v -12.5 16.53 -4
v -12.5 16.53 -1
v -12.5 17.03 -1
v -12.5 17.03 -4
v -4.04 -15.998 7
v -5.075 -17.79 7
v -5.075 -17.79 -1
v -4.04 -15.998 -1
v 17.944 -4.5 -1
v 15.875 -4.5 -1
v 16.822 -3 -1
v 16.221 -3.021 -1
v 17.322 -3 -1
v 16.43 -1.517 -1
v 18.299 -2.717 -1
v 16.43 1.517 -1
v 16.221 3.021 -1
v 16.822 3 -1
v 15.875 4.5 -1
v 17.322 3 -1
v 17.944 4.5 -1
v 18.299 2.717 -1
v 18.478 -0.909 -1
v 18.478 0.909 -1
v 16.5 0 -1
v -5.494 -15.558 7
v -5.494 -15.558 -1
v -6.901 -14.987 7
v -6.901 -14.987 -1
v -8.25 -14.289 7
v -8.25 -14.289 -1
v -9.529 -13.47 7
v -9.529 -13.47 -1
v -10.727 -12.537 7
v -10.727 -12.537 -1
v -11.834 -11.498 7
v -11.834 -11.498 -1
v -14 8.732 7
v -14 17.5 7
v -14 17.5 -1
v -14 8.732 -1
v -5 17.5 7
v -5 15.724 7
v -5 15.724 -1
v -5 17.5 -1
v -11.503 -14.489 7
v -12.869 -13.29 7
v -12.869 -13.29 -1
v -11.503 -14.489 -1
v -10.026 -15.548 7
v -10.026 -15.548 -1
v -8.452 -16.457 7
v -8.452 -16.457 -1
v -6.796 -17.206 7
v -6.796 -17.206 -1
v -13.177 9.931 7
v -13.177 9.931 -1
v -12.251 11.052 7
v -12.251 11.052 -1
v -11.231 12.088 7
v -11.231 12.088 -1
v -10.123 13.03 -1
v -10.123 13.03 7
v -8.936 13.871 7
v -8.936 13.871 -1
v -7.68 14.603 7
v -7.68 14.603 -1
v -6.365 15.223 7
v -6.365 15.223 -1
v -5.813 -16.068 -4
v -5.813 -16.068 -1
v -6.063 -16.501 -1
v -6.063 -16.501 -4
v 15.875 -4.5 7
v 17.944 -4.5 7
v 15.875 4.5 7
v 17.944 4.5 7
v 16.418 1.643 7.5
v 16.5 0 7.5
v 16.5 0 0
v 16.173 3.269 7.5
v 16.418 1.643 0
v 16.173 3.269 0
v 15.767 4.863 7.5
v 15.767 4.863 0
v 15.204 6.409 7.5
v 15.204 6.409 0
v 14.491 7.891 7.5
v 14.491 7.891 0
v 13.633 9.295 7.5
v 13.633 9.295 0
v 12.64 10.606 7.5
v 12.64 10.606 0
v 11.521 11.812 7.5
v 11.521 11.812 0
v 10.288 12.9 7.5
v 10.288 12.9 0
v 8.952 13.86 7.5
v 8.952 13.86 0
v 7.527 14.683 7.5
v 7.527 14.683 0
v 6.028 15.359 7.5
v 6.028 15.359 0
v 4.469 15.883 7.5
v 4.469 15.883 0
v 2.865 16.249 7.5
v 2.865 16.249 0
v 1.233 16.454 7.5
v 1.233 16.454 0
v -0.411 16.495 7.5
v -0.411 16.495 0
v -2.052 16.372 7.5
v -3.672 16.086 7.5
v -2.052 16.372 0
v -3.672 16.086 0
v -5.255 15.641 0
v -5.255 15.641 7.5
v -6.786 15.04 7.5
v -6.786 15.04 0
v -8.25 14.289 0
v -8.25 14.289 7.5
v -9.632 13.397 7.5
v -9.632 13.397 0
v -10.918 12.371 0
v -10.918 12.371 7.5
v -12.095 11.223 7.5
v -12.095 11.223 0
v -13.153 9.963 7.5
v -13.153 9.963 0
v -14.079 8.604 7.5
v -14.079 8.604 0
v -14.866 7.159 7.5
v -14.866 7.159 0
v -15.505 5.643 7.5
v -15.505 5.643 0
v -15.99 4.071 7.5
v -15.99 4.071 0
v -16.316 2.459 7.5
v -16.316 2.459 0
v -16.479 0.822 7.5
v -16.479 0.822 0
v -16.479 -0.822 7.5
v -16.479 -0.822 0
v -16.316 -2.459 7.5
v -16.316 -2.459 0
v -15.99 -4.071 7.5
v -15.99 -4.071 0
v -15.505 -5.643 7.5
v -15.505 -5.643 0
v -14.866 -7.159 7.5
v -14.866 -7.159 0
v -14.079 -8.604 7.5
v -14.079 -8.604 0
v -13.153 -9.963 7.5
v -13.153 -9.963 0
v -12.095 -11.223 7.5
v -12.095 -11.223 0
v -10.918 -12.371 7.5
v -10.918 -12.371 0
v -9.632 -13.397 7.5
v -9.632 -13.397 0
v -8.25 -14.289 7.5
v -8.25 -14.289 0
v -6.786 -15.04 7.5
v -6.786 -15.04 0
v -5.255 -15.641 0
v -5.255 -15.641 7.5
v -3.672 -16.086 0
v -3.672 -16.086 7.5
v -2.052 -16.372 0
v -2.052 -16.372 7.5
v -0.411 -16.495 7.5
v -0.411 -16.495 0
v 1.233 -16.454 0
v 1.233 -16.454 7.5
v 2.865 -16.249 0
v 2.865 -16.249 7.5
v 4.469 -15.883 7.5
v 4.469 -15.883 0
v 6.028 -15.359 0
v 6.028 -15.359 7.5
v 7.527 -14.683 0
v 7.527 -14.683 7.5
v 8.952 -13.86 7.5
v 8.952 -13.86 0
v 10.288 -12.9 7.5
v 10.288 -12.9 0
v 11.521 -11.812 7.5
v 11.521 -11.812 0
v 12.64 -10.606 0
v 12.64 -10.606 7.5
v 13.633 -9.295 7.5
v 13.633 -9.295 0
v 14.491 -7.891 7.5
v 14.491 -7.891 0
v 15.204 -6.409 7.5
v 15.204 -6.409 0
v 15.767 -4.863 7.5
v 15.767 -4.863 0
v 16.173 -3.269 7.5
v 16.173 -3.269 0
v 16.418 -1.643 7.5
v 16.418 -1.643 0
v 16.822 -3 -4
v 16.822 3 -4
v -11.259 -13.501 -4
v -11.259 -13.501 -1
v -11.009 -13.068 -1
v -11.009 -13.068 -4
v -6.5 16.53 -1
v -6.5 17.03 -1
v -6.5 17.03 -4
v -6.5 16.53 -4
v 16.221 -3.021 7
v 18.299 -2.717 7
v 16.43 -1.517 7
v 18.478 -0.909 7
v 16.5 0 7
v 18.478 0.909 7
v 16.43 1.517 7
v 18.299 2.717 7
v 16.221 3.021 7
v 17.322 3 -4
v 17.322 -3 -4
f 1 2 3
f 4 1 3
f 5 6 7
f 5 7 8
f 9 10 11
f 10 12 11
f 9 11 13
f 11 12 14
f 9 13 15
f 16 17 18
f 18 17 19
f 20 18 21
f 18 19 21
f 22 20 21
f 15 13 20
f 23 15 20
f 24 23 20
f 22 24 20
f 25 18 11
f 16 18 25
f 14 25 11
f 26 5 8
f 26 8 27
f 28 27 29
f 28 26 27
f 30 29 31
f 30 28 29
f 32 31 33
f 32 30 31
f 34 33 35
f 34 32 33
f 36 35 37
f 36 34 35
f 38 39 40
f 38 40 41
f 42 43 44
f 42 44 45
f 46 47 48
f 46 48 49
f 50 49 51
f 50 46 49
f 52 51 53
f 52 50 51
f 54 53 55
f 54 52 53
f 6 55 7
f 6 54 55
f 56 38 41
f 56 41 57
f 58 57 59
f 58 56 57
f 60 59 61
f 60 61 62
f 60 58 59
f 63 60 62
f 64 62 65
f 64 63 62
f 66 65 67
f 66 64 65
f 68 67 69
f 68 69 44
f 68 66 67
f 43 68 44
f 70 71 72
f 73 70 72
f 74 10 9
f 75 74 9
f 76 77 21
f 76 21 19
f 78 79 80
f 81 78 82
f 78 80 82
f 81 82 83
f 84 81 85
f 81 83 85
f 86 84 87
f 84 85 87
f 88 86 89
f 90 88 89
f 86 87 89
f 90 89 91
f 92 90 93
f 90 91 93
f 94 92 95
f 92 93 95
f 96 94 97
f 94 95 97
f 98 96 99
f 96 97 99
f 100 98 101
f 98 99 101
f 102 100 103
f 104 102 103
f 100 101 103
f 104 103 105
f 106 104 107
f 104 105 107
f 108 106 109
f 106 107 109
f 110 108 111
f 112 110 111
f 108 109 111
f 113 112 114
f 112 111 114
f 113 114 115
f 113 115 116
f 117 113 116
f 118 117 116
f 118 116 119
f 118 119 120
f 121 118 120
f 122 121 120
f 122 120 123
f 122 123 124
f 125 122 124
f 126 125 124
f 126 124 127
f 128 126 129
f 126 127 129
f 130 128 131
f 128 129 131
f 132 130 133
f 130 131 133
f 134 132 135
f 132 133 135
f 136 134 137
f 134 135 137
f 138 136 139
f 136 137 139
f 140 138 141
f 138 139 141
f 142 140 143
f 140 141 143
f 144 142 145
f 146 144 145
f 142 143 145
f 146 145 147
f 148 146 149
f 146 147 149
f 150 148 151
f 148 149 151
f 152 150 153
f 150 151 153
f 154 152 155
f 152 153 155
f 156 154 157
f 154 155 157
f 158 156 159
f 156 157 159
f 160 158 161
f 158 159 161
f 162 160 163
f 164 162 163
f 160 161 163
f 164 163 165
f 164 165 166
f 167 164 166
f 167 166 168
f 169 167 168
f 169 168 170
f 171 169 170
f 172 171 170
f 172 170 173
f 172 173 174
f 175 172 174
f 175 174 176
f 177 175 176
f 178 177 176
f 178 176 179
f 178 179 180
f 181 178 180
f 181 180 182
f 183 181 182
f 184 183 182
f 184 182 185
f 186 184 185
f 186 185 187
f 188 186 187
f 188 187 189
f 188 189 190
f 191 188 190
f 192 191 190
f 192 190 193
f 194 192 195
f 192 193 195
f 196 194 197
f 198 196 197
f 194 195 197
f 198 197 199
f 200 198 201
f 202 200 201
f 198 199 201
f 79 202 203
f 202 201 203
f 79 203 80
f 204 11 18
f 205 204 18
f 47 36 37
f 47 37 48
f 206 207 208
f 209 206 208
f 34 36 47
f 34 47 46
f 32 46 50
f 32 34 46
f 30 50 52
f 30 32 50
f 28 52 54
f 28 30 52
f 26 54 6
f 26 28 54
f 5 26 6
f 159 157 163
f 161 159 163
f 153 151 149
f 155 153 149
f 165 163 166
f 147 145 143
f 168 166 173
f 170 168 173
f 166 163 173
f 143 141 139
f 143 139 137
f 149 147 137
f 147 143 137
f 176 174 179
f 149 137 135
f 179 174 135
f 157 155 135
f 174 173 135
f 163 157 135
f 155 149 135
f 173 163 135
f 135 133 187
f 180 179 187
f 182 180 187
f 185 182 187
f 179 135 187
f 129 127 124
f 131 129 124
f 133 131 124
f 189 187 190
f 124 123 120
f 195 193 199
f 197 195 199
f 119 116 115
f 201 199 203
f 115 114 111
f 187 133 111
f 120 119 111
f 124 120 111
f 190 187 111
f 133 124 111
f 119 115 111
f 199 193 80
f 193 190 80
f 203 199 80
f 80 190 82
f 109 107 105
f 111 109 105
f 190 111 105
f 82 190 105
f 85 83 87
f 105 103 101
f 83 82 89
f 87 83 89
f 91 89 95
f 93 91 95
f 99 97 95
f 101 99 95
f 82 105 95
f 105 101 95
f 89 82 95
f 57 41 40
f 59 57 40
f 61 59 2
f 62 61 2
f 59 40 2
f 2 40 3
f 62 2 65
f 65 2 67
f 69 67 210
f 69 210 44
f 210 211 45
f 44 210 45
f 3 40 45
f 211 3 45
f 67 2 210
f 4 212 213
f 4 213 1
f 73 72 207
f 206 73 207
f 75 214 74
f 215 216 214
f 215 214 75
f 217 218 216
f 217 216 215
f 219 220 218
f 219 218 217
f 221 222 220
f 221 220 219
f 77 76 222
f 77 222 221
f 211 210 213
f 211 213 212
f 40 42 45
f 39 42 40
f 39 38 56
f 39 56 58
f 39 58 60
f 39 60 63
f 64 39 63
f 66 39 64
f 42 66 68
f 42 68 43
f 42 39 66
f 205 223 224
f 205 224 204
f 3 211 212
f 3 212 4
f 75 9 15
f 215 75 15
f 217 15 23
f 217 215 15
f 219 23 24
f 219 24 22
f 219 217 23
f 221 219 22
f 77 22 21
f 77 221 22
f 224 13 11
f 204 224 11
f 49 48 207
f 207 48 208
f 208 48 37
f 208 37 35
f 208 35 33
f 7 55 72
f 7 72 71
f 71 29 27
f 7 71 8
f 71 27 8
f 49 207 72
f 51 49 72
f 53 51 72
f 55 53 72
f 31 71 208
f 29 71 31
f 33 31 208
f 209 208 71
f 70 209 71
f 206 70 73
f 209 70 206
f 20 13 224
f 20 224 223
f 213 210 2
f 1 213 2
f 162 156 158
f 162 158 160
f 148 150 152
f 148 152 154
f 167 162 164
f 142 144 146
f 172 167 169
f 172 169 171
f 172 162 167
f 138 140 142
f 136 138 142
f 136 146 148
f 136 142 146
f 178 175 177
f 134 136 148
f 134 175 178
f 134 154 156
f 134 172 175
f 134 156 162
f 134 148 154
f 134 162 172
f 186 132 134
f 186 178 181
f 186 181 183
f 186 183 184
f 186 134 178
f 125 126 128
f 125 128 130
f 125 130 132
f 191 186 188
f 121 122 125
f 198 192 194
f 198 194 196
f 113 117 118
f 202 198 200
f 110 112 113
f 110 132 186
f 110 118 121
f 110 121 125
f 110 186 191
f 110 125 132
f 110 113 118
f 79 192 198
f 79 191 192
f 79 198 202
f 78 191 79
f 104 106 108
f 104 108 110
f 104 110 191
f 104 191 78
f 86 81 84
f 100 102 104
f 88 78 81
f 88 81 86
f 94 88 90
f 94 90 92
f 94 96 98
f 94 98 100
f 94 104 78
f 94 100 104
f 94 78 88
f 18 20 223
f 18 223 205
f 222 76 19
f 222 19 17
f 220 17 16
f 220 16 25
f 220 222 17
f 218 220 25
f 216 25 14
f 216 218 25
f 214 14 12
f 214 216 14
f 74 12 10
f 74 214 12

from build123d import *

# Parameters (mm, degrees)
ESQUISSE1_R        = 16.5
EXTRUSION1_DEPTH   = 7.5
EXTRUSION2_DEPTH   = 8
EXTRUSION2_2_DEPTH = 8
EXTRUSION2_3_DEPTH = 8
ESQUISSE3_W        = 0.5
ESQUISSE3_H        = 6
ESQUISSE3_W_2      = 6
ESQUISSE3_H_2      = 0.5
EXTRUSION3_DEPTH   = 3


with BuildPart() as part:
    # Esquisse1 → Extrusion1 (new body)
    with BuildSketch(Plane.XY):
        Circle(ESQUISSE1_R)
    extrude(amount=EXTRUSION1_DEPTH)


with BuildPart() as body_2:
    # Esquisse2 → Extrusion2 (new body)
    with BuildSketch(Plane.XY.offset(7)):
        with BuildLine():
            Line((15.874507866, -4.5), (17.944358445, -4.5))
            ThreePointArc((17.944358445, -4.5), (18.5, 0), (17.944358445, 4.5))
            Line((17.944358445, 4.5), (15.874507866, 4.5))
            ThreePointArc((15.874507866, 4.5), (16.5, 0), (15.874507866, -4.5))
        make_face()
    extrude(amount=-EXTRUSION2_DEPTH)



with BuildPart() as body_3:
    # Esquisse2 → Extrusion2 2 (new body)
    with BuildSketch(Plane.XY.offset(7)):
        with BuildLine():
            Line((-11.83436825, -11.497727085), (-12.869293539, -13.290270268))
            ThreePointArc((-12.869293539, -13.290270268), (-9.25, -16.02146997), (-5.075064905, -17.790270268))
            Line((-5.075064905, -17.790270268), (-4.040139616, -15.997727085))
            ThreePointArc((-4.040139616, -15.997727085), (-8.25, -14.289419162), (-11.83436825, -11.497727085))
        make_face()
    extrude(amount=-EXTRUSION2_2_DEPTH)


with BuildPart() as body_4:
    # Esquisse2 → Extrusion2 3 (new body)
    with BuildSketch(Plane.XY.offset(7)):
        with BuildLine():
            Line((-5, 15.724185194), (-5, 17.5))
            Line((-5, 17.5), (-14, 17.5))
            Line((-14, 17.5), (-14, 8.732124598))
            ThreePointArc((-14, 8.732124598), (-10.122856704, 13.029879975), (-5, 15.724185194))
        make_face()
    extrude(amount=-EXTRUSION2_3_DEPTH)


with BuildPart() as body_2_1:
    add(body_2.part)

    add(body_3.part)  # Extrusion3 merges body 3

    add(body_4.part)  # Extrusion3 merges body 4
    # Esquisse3 → Extrusion3 (add)
    with BuildSketch(Plane(origin=(0, 0, -1), x_dir=(-1, 0, 0), z_dir=(0, 0, -1))):
        with Locations((-17.071633817, 0)):
            Rectangle(ESQUISSE3_W, ESQUISSE3_H)
        Polygon((6.062740697, -16.500974921), (11.25889312, -13.500974921), (11.00889312, -13.067962219), (5.812740697, -16.067962219), align=None)
        with Locations((9.5, 16.779676872)):
            Rectangle(ESQUISSE3_W_2, ESQUISSE3_H_2)
    extrude(amount=EXTRUSION3_DEPTH)


solid = Compound([part.part, body_2_1.part])
